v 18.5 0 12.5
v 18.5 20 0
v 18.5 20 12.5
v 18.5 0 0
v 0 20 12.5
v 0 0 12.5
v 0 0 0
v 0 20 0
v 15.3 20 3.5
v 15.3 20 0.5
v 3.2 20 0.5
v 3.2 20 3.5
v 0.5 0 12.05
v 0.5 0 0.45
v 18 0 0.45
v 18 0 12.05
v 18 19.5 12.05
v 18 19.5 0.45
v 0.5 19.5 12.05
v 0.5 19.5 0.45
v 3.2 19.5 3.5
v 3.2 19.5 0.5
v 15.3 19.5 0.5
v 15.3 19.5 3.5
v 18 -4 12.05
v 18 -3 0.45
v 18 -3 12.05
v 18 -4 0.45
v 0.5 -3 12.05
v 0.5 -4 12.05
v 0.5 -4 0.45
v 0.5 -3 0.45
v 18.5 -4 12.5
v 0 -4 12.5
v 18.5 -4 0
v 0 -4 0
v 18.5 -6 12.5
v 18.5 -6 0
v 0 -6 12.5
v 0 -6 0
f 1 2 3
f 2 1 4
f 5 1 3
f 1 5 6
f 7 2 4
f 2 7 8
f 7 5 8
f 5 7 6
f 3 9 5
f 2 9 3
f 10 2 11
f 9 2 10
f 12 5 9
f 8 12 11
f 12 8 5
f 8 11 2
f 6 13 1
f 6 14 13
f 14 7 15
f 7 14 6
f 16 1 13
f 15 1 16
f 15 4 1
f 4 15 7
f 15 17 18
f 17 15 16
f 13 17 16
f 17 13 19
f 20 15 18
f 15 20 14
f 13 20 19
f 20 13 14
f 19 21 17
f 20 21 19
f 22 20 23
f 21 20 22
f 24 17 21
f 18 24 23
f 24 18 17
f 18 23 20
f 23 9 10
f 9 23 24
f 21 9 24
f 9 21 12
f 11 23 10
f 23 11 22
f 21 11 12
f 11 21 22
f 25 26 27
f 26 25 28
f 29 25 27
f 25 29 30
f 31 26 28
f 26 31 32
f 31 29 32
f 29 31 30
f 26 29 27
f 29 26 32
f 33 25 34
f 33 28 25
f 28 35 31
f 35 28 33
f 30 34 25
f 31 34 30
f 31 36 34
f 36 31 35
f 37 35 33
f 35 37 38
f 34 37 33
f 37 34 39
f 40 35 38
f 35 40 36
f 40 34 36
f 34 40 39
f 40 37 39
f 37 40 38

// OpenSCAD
difference(){
    cube([18.5, 20, 12.5], false);
    translate([0.5, -1, 0.45]){
        cube([17.5, 20.5, 11.6], false);
    }
    translate([3.2, 0.25, 0.5]){
        cube([12.1, 20, 3], false);
    }
}
translate([0.5, -4, 0.45]){
    cube([17.5, 1, 11.6], false);
}
translate([0, -6, 0]){
    cube([18.5, 2, 12.5], false);
}
